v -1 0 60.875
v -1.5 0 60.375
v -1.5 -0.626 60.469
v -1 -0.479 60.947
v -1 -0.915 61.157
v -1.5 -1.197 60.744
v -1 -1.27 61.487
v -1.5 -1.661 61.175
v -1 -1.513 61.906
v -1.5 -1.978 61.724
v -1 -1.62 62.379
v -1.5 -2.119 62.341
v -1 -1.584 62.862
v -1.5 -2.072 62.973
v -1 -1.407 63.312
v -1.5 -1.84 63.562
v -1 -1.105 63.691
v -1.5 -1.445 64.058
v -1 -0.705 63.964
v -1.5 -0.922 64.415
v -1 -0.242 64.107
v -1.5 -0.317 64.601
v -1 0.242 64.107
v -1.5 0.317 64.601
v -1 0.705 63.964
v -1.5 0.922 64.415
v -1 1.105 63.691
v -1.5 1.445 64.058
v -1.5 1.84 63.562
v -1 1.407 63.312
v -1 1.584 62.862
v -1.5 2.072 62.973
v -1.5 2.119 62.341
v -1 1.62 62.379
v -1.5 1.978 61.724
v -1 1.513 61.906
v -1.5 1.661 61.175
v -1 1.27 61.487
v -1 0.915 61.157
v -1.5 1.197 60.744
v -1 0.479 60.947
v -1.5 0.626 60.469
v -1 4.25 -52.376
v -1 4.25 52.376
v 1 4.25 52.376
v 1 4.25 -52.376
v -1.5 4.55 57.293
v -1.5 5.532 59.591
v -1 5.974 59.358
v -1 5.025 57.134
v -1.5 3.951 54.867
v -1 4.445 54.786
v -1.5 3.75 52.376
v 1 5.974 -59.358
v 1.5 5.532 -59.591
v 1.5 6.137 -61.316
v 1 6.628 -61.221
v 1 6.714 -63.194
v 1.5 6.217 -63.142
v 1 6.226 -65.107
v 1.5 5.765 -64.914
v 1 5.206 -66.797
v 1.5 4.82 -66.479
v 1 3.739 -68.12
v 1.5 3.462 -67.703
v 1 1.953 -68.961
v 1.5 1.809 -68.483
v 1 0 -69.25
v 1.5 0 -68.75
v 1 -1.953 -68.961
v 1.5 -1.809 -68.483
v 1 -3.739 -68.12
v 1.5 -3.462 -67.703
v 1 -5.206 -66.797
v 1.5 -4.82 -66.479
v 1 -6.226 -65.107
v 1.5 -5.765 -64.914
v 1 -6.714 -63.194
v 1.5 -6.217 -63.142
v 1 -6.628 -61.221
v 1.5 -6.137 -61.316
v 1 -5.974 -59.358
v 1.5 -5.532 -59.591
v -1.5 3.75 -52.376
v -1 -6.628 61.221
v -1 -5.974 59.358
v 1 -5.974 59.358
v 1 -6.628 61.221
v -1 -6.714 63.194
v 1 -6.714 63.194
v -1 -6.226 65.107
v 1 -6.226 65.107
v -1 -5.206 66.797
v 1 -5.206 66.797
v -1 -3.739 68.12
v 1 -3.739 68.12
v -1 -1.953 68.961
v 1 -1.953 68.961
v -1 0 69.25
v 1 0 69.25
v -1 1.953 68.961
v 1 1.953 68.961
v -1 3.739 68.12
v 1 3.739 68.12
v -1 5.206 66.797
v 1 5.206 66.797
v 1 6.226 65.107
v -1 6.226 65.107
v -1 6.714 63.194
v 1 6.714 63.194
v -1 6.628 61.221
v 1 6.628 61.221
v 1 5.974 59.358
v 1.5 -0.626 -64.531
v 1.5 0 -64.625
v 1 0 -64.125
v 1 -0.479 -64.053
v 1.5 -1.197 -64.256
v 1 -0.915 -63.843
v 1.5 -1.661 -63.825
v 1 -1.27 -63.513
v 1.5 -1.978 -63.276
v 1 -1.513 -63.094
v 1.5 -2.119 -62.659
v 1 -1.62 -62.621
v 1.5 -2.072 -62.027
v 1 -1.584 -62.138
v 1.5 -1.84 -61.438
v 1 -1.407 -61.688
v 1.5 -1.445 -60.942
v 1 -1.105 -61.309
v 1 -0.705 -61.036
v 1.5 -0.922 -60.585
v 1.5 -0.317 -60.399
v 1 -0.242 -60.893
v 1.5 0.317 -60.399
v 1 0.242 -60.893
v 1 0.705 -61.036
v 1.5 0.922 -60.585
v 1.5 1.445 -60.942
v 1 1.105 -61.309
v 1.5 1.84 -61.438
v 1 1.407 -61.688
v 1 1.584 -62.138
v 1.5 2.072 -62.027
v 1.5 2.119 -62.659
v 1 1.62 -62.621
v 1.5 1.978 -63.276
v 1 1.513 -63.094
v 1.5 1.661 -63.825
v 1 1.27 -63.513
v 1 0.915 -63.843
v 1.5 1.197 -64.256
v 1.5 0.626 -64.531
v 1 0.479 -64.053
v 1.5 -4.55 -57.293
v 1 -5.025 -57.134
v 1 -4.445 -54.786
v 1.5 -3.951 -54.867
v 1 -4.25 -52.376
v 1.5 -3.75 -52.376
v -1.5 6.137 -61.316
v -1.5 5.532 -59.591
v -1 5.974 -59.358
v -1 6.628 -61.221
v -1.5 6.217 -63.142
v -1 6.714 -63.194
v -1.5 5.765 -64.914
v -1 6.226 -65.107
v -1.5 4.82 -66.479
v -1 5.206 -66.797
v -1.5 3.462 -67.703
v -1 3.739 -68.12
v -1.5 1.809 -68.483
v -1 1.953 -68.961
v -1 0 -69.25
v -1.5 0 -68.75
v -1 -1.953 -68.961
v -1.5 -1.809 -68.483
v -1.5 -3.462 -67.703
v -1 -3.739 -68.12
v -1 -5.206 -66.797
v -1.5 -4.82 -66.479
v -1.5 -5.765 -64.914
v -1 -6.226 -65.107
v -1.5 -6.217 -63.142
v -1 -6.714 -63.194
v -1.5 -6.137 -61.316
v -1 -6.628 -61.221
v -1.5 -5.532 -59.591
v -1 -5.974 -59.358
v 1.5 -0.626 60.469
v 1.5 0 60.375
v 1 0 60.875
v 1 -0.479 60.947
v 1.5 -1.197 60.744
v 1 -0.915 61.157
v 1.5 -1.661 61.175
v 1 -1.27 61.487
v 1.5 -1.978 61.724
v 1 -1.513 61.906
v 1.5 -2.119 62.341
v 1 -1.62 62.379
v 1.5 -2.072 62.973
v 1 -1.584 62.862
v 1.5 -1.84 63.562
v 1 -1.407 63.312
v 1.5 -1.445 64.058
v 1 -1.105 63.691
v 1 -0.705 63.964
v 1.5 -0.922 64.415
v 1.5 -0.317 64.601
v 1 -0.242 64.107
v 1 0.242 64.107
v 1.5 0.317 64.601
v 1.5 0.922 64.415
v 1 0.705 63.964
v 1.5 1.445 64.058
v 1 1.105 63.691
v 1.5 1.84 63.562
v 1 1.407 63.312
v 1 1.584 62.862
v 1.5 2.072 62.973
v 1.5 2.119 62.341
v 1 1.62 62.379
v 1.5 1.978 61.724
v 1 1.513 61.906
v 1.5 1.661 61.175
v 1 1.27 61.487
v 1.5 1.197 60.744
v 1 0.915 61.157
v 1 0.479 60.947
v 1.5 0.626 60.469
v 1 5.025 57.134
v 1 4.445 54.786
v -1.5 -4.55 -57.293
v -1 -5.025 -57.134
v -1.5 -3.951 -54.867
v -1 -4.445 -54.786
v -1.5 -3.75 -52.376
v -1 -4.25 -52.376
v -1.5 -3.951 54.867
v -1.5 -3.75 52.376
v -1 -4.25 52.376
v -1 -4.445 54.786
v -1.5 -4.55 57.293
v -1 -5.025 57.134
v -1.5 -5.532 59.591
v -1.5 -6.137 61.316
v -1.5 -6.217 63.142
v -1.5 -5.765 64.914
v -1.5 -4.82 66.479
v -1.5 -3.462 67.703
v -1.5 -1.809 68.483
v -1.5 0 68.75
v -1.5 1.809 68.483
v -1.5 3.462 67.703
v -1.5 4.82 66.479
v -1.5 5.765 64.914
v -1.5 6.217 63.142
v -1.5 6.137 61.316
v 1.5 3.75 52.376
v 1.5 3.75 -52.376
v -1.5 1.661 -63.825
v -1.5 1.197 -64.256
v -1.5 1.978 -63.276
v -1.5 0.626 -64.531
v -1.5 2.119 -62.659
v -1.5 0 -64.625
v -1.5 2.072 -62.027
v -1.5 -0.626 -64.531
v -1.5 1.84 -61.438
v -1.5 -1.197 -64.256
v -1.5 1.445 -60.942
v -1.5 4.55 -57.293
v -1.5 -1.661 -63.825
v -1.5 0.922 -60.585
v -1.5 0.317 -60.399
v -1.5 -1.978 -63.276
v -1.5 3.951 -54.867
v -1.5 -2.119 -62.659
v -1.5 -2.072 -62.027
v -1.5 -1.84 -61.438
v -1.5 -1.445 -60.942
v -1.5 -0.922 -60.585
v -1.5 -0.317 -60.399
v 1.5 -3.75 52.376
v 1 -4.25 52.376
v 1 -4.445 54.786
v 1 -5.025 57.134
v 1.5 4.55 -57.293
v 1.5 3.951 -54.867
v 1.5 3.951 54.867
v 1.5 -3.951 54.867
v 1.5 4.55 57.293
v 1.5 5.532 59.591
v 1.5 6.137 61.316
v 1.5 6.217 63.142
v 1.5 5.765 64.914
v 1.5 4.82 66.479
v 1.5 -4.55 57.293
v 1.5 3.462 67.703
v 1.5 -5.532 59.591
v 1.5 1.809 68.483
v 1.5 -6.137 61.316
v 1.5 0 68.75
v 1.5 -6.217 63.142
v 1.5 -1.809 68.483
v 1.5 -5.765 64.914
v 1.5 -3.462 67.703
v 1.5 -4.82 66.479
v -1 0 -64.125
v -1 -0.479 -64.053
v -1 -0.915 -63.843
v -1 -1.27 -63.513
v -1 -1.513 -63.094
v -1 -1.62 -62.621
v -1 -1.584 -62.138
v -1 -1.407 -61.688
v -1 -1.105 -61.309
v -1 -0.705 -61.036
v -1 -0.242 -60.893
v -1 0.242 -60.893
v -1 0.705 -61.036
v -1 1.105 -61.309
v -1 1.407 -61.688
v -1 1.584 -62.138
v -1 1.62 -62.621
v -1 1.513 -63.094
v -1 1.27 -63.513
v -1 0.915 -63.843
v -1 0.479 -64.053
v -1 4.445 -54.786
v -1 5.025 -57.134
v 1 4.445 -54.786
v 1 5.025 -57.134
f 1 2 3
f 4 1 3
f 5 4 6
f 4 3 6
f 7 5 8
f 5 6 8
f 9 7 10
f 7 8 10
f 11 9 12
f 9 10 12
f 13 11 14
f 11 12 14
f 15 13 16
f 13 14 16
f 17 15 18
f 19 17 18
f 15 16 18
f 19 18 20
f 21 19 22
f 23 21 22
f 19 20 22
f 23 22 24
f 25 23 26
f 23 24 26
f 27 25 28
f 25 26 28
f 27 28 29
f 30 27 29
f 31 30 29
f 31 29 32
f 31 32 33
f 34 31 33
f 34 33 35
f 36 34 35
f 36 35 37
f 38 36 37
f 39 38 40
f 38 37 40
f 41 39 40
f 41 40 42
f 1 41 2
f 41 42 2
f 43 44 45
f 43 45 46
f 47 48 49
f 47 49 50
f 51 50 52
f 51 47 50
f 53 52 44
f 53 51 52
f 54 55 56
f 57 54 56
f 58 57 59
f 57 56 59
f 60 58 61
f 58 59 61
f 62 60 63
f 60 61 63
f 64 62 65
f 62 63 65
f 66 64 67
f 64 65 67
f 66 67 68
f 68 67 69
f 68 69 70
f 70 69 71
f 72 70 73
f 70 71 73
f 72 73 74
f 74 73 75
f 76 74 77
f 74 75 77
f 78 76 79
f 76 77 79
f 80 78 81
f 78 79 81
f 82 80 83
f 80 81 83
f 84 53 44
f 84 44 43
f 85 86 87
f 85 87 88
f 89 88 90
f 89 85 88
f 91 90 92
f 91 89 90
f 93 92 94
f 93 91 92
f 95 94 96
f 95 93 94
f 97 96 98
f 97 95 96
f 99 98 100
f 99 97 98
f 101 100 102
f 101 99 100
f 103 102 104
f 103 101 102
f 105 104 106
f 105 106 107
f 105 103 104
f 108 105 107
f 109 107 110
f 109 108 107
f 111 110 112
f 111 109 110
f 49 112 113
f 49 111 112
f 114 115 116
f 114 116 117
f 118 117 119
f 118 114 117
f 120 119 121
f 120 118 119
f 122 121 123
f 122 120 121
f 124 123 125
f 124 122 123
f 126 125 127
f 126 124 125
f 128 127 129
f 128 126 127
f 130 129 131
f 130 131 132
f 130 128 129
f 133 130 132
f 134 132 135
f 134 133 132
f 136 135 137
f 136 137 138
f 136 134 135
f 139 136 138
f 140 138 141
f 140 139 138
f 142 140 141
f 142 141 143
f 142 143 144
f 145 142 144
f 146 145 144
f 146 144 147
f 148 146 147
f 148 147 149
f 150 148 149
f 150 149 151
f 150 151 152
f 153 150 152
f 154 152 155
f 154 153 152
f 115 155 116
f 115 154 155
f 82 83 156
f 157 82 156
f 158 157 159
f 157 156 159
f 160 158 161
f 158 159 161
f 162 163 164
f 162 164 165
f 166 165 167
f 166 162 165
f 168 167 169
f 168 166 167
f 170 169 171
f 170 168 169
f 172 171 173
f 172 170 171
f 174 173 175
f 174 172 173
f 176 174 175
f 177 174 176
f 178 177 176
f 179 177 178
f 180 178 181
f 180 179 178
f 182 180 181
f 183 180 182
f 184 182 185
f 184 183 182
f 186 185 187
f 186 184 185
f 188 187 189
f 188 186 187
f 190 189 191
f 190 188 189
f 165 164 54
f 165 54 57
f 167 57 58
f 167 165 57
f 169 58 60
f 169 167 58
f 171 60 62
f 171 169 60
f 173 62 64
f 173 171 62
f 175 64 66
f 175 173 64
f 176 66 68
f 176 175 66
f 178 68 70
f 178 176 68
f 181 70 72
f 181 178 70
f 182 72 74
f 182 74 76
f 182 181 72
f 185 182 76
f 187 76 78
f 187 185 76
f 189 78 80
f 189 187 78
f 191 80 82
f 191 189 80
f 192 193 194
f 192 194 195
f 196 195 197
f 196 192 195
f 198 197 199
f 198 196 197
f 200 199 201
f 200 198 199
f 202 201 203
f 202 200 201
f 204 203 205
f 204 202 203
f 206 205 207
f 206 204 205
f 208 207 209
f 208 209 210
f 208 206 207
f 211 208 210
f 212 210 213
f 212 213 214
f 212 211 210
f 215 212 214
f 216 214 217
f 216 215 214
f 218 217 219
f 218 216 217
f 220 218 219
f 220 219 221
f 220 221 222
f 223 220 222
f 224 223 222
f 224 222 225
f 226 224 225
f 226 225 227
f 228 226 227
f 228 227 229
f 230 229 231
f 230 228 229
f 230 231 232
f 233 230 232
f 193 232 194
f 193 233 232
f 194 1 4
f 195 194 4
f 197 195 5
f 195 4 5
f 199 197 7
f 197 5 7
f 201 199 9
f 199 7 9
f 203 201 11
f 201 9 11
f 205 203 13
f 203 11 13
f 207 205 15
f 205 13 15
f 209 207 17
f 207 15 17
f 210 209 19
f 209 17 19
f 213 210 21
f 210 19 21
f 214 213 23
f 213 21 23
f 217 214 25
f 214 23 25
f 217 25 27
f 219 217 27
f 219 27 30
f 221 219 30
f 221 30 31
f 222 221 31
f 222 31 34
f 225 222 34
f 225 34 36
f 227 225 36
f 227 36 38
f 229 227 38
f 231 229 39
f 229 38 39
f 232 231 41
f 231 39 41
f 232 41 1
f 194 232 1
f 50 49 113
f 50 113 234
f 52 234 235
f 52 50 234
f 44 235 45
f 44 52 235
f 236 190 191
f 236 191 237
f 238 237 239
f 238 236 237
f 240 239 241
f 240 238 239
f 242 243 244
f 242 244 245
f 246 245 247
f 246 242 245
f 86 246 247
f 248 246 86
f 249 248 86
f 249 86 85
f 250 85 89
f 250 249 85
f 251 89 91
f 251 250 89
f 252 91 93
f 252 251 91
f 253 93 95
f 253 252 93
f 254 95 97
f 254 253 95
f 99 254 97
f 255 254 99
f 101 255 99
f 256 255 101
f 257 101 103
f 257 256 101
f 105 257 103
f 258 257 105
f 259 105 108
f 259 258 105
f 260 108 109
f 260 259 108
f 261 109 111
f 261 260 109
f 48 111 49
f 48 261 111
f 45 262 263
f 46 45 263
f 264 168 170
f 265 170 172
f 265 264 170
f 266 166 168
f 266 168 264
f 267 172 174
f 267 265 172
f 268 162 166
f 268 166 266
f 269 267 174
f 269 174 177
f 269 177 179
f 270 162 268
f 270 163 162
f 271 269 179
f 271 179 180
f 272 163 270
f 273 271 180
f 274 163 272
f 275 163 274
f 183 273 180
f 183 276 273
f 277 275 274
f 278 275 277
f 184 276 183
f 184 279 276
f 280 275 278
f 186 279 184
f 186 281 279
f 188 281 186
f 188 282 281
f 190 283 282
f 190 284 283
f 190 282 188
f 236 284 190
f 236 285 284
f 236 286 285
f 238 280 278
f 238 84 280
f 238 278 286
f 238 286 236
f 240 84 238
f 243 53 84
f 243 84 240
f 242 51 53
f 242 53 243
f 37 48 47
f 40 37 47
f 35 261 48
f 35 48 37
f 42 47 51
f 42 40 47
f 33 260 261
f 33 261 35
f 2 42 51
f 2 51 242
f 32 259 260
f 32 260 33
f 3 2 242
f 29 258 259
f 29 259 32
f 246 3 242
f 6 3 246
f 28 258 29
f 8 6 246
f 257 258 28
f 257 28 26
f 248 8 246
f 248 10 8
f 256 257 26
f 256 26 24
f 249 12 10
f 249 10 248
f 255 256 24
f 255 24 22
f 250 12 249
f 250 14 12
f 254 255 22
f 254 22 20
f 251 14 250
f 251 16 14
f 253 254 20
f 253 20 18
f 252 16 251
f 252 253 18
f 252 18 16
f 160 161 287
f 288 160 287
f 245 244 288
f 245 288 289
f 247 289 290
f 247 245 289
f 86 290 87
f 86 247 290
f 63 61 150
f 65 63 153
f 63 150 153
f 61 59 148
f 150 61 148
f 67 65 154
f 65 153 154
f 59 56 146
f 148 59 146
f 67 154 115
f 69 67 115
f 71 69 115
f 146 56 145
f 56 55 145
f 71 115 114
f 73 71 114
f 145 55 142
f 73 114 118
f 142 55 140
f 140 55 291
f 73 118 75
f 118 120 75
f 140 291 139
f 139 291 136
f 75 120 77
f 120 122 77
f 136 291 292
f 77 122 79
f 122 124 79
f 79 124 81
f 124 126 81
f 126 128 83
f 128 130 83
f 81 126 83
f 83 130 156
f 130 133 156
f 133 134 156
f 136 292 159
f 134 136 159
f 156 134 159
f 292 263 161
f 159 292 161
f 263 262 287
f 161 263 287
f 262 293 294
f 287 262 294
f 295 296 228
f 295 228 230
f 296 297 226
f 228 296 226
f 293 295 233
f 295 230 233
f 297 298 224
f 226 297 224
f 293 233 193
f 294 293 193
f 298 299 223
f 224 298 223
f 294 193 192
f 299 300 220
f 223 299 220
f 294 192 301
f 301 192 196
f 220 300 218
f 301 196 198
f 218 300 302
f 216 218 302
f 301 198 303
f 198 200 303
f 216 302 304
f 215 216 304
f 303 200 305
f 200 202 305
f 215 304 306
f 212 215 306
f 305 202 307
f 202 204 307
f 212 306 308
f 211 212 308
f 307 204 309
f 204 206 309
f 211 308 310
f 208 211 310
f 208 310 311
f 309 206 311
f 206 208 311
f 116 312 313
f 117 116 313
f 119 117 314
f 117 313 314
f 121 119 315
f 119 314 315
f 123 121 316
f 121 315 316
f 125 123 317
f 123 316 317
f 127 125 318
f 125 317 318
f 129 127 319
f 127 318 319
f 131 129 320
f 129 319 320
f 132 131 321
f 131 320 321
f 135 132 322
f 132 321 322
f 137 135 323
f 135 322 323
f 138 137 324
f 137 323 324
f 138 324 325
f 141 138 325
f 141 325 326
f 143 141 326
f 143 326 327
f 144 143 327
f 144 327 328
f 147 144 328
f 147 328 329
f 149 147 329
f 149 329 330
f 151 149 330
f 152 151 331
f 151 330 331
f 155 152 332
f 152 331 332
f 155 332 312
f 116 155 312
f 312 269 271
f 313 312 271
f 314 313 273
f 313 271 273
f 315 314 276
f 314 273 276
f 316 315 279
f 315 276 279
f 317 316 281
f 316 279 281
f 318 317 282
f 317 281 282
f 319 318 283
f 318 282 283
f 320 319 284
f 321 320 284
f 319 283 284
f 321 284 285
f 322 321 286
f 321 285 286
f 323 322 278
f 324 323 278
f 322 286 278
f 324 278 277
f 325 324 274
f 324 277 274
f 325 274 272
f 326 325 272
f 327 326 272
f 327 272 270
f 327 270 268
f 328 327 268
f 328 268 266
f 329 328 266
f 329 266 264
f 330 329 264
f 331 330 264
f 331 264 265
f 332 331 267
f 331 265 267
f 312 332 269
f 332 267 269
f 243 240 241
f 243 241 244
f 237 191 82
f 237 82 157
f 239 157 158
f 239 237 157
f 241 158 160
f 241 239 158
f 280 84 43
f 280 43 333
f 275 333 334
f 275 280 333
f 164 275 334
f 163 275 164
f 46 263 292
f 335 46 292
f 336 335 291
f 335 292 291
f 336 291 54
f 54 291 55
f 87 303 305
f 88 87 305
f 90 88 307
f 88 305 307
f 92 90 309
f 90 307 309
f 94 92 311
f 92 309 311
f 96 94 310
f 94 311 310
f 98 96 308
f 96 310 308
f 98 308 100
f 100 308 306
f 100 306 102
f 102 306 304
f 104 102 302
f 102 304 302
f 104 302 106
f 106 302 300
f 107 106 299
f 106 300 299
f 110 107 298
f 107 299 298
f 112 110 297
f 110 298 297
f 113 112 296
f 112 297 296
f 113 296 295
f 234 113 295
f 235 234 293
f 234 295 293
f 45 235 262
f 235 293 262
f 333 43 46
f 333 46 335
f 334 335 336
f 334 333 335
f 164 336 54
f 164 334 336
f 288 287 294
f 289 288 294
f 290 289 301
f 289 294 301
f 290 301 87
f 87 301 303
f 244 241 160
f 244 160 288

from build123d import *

# Parameters (mm, degrees)
SKETCH_1_R      = 1.625
EXTRUDE_1_DEPTH = 3
CHAMFER_1_SIZE  = 0.5
EXTRUDE_2_DEPTH = 3


with BuildPart() as part:
    # 草图1 → 凸台-拉伸1 (new body)
    with BuildSketch(Plane(origin=(-1.5, 0, 0), x_dir=(0, -1, 0), z_dir=(-1, 0, 0))):
        with BuildLine():
            Line((4.25, -52.375771634), (4.25, 52.375771634))
            ThreePointArc((4.25, 52.375771634), (4.687412128, 55.971746395), (5.974137931, 59.357998093))
            ThreePointArc((5.974137931, 59.357998093), (0, 69.25), (-5.974137931, 59.357998093))
            ThreePointArc((-5.974137931, 59.357998093), (-4.687412128, 55.971746395), (-4.25, 52.375771634))
            Line((-4.25, 52.375771634), (-4.25, -52.375771634))
            ThreePointArc((-4.25, -52.375771634), (-4.687412128, -55.971746395), (-5.974137931, -59.357998093))
            ThreePointArc((-5.974137931, -59.357998093), (0, -69.25), (5.974137931, -59.357998093))
            ThreePointArc((5.974137931, -59.357998093), (4.687412128, -55.971746395), (4.25, -52.375771634))
        make_face()
        with Locations(Location((0, -62.5, 0), (0, 0, 270))):
            Circle(SKETCH_1_R, mode=Mode.SUBTRACT)
        with Locations(Location((0, 62.5, 0), (0, 0, 270))):
            Circle(SKETCH_1_R, mode=Mode.SUBTRACT)
    extrude(amount=-EXTRUDE_1_DEPTH)

    # 倒角1
    chamfer_1_edges = [part.edges().sort_by_distance(p)[0] for p in [
        (-1.5, -4.25, 0),
        (-1.5, -4.687412128, -55.971746395),
        (-1.5, 0, -69.25),
        (-1.5, 4.687412128, -55.971746395),
        (1.5, -4.687412128, -55.971746395),
        (1.5, -4.25, 0),
        (1.5, -4.687412128, 55.971746395),
        (1.5, 0, -60.875),
        (-1.5, 0, -60.875),
        (1.5, 0, 69.25),
        (1.5, 0, 64.125),
        (-1.5, 0, 64.125),
        (1.5, 4.687412128, 55.971746395),
        (1.5, 4.25, 0),
        (1.5, 4.687412128, -55.971746395),
        (-1.5, 4.25, 0),
        (1.5, 0, -69.25),
        (-1.5, 4.687412128, 55.971746395),
        (-1.5, 0, 69.25),
        (-1.5, -4.687412128, 55.971746395),
    ]]
    chamfer(chamfer_1_edges, length=CHAMFER_1_SIZE)

    # Sketch 3D_1 → 凸台-拉伸2 (add)
    with BuildSketch(Plane(origin=(-1.5, 1.411337563, 55.448843226), x_dir=(0, -0.022148278790467303, -0.9997546967864767), z_dir=(1, 0, 0))):
        Polygon((0, 0), (110.093393882, 2.43897747), (110.147426289, 0), (0.054032407, -2.43897747), align=None)
    extrude(amount=EXTRUDE_2_DEPTH)


solid = part.part
